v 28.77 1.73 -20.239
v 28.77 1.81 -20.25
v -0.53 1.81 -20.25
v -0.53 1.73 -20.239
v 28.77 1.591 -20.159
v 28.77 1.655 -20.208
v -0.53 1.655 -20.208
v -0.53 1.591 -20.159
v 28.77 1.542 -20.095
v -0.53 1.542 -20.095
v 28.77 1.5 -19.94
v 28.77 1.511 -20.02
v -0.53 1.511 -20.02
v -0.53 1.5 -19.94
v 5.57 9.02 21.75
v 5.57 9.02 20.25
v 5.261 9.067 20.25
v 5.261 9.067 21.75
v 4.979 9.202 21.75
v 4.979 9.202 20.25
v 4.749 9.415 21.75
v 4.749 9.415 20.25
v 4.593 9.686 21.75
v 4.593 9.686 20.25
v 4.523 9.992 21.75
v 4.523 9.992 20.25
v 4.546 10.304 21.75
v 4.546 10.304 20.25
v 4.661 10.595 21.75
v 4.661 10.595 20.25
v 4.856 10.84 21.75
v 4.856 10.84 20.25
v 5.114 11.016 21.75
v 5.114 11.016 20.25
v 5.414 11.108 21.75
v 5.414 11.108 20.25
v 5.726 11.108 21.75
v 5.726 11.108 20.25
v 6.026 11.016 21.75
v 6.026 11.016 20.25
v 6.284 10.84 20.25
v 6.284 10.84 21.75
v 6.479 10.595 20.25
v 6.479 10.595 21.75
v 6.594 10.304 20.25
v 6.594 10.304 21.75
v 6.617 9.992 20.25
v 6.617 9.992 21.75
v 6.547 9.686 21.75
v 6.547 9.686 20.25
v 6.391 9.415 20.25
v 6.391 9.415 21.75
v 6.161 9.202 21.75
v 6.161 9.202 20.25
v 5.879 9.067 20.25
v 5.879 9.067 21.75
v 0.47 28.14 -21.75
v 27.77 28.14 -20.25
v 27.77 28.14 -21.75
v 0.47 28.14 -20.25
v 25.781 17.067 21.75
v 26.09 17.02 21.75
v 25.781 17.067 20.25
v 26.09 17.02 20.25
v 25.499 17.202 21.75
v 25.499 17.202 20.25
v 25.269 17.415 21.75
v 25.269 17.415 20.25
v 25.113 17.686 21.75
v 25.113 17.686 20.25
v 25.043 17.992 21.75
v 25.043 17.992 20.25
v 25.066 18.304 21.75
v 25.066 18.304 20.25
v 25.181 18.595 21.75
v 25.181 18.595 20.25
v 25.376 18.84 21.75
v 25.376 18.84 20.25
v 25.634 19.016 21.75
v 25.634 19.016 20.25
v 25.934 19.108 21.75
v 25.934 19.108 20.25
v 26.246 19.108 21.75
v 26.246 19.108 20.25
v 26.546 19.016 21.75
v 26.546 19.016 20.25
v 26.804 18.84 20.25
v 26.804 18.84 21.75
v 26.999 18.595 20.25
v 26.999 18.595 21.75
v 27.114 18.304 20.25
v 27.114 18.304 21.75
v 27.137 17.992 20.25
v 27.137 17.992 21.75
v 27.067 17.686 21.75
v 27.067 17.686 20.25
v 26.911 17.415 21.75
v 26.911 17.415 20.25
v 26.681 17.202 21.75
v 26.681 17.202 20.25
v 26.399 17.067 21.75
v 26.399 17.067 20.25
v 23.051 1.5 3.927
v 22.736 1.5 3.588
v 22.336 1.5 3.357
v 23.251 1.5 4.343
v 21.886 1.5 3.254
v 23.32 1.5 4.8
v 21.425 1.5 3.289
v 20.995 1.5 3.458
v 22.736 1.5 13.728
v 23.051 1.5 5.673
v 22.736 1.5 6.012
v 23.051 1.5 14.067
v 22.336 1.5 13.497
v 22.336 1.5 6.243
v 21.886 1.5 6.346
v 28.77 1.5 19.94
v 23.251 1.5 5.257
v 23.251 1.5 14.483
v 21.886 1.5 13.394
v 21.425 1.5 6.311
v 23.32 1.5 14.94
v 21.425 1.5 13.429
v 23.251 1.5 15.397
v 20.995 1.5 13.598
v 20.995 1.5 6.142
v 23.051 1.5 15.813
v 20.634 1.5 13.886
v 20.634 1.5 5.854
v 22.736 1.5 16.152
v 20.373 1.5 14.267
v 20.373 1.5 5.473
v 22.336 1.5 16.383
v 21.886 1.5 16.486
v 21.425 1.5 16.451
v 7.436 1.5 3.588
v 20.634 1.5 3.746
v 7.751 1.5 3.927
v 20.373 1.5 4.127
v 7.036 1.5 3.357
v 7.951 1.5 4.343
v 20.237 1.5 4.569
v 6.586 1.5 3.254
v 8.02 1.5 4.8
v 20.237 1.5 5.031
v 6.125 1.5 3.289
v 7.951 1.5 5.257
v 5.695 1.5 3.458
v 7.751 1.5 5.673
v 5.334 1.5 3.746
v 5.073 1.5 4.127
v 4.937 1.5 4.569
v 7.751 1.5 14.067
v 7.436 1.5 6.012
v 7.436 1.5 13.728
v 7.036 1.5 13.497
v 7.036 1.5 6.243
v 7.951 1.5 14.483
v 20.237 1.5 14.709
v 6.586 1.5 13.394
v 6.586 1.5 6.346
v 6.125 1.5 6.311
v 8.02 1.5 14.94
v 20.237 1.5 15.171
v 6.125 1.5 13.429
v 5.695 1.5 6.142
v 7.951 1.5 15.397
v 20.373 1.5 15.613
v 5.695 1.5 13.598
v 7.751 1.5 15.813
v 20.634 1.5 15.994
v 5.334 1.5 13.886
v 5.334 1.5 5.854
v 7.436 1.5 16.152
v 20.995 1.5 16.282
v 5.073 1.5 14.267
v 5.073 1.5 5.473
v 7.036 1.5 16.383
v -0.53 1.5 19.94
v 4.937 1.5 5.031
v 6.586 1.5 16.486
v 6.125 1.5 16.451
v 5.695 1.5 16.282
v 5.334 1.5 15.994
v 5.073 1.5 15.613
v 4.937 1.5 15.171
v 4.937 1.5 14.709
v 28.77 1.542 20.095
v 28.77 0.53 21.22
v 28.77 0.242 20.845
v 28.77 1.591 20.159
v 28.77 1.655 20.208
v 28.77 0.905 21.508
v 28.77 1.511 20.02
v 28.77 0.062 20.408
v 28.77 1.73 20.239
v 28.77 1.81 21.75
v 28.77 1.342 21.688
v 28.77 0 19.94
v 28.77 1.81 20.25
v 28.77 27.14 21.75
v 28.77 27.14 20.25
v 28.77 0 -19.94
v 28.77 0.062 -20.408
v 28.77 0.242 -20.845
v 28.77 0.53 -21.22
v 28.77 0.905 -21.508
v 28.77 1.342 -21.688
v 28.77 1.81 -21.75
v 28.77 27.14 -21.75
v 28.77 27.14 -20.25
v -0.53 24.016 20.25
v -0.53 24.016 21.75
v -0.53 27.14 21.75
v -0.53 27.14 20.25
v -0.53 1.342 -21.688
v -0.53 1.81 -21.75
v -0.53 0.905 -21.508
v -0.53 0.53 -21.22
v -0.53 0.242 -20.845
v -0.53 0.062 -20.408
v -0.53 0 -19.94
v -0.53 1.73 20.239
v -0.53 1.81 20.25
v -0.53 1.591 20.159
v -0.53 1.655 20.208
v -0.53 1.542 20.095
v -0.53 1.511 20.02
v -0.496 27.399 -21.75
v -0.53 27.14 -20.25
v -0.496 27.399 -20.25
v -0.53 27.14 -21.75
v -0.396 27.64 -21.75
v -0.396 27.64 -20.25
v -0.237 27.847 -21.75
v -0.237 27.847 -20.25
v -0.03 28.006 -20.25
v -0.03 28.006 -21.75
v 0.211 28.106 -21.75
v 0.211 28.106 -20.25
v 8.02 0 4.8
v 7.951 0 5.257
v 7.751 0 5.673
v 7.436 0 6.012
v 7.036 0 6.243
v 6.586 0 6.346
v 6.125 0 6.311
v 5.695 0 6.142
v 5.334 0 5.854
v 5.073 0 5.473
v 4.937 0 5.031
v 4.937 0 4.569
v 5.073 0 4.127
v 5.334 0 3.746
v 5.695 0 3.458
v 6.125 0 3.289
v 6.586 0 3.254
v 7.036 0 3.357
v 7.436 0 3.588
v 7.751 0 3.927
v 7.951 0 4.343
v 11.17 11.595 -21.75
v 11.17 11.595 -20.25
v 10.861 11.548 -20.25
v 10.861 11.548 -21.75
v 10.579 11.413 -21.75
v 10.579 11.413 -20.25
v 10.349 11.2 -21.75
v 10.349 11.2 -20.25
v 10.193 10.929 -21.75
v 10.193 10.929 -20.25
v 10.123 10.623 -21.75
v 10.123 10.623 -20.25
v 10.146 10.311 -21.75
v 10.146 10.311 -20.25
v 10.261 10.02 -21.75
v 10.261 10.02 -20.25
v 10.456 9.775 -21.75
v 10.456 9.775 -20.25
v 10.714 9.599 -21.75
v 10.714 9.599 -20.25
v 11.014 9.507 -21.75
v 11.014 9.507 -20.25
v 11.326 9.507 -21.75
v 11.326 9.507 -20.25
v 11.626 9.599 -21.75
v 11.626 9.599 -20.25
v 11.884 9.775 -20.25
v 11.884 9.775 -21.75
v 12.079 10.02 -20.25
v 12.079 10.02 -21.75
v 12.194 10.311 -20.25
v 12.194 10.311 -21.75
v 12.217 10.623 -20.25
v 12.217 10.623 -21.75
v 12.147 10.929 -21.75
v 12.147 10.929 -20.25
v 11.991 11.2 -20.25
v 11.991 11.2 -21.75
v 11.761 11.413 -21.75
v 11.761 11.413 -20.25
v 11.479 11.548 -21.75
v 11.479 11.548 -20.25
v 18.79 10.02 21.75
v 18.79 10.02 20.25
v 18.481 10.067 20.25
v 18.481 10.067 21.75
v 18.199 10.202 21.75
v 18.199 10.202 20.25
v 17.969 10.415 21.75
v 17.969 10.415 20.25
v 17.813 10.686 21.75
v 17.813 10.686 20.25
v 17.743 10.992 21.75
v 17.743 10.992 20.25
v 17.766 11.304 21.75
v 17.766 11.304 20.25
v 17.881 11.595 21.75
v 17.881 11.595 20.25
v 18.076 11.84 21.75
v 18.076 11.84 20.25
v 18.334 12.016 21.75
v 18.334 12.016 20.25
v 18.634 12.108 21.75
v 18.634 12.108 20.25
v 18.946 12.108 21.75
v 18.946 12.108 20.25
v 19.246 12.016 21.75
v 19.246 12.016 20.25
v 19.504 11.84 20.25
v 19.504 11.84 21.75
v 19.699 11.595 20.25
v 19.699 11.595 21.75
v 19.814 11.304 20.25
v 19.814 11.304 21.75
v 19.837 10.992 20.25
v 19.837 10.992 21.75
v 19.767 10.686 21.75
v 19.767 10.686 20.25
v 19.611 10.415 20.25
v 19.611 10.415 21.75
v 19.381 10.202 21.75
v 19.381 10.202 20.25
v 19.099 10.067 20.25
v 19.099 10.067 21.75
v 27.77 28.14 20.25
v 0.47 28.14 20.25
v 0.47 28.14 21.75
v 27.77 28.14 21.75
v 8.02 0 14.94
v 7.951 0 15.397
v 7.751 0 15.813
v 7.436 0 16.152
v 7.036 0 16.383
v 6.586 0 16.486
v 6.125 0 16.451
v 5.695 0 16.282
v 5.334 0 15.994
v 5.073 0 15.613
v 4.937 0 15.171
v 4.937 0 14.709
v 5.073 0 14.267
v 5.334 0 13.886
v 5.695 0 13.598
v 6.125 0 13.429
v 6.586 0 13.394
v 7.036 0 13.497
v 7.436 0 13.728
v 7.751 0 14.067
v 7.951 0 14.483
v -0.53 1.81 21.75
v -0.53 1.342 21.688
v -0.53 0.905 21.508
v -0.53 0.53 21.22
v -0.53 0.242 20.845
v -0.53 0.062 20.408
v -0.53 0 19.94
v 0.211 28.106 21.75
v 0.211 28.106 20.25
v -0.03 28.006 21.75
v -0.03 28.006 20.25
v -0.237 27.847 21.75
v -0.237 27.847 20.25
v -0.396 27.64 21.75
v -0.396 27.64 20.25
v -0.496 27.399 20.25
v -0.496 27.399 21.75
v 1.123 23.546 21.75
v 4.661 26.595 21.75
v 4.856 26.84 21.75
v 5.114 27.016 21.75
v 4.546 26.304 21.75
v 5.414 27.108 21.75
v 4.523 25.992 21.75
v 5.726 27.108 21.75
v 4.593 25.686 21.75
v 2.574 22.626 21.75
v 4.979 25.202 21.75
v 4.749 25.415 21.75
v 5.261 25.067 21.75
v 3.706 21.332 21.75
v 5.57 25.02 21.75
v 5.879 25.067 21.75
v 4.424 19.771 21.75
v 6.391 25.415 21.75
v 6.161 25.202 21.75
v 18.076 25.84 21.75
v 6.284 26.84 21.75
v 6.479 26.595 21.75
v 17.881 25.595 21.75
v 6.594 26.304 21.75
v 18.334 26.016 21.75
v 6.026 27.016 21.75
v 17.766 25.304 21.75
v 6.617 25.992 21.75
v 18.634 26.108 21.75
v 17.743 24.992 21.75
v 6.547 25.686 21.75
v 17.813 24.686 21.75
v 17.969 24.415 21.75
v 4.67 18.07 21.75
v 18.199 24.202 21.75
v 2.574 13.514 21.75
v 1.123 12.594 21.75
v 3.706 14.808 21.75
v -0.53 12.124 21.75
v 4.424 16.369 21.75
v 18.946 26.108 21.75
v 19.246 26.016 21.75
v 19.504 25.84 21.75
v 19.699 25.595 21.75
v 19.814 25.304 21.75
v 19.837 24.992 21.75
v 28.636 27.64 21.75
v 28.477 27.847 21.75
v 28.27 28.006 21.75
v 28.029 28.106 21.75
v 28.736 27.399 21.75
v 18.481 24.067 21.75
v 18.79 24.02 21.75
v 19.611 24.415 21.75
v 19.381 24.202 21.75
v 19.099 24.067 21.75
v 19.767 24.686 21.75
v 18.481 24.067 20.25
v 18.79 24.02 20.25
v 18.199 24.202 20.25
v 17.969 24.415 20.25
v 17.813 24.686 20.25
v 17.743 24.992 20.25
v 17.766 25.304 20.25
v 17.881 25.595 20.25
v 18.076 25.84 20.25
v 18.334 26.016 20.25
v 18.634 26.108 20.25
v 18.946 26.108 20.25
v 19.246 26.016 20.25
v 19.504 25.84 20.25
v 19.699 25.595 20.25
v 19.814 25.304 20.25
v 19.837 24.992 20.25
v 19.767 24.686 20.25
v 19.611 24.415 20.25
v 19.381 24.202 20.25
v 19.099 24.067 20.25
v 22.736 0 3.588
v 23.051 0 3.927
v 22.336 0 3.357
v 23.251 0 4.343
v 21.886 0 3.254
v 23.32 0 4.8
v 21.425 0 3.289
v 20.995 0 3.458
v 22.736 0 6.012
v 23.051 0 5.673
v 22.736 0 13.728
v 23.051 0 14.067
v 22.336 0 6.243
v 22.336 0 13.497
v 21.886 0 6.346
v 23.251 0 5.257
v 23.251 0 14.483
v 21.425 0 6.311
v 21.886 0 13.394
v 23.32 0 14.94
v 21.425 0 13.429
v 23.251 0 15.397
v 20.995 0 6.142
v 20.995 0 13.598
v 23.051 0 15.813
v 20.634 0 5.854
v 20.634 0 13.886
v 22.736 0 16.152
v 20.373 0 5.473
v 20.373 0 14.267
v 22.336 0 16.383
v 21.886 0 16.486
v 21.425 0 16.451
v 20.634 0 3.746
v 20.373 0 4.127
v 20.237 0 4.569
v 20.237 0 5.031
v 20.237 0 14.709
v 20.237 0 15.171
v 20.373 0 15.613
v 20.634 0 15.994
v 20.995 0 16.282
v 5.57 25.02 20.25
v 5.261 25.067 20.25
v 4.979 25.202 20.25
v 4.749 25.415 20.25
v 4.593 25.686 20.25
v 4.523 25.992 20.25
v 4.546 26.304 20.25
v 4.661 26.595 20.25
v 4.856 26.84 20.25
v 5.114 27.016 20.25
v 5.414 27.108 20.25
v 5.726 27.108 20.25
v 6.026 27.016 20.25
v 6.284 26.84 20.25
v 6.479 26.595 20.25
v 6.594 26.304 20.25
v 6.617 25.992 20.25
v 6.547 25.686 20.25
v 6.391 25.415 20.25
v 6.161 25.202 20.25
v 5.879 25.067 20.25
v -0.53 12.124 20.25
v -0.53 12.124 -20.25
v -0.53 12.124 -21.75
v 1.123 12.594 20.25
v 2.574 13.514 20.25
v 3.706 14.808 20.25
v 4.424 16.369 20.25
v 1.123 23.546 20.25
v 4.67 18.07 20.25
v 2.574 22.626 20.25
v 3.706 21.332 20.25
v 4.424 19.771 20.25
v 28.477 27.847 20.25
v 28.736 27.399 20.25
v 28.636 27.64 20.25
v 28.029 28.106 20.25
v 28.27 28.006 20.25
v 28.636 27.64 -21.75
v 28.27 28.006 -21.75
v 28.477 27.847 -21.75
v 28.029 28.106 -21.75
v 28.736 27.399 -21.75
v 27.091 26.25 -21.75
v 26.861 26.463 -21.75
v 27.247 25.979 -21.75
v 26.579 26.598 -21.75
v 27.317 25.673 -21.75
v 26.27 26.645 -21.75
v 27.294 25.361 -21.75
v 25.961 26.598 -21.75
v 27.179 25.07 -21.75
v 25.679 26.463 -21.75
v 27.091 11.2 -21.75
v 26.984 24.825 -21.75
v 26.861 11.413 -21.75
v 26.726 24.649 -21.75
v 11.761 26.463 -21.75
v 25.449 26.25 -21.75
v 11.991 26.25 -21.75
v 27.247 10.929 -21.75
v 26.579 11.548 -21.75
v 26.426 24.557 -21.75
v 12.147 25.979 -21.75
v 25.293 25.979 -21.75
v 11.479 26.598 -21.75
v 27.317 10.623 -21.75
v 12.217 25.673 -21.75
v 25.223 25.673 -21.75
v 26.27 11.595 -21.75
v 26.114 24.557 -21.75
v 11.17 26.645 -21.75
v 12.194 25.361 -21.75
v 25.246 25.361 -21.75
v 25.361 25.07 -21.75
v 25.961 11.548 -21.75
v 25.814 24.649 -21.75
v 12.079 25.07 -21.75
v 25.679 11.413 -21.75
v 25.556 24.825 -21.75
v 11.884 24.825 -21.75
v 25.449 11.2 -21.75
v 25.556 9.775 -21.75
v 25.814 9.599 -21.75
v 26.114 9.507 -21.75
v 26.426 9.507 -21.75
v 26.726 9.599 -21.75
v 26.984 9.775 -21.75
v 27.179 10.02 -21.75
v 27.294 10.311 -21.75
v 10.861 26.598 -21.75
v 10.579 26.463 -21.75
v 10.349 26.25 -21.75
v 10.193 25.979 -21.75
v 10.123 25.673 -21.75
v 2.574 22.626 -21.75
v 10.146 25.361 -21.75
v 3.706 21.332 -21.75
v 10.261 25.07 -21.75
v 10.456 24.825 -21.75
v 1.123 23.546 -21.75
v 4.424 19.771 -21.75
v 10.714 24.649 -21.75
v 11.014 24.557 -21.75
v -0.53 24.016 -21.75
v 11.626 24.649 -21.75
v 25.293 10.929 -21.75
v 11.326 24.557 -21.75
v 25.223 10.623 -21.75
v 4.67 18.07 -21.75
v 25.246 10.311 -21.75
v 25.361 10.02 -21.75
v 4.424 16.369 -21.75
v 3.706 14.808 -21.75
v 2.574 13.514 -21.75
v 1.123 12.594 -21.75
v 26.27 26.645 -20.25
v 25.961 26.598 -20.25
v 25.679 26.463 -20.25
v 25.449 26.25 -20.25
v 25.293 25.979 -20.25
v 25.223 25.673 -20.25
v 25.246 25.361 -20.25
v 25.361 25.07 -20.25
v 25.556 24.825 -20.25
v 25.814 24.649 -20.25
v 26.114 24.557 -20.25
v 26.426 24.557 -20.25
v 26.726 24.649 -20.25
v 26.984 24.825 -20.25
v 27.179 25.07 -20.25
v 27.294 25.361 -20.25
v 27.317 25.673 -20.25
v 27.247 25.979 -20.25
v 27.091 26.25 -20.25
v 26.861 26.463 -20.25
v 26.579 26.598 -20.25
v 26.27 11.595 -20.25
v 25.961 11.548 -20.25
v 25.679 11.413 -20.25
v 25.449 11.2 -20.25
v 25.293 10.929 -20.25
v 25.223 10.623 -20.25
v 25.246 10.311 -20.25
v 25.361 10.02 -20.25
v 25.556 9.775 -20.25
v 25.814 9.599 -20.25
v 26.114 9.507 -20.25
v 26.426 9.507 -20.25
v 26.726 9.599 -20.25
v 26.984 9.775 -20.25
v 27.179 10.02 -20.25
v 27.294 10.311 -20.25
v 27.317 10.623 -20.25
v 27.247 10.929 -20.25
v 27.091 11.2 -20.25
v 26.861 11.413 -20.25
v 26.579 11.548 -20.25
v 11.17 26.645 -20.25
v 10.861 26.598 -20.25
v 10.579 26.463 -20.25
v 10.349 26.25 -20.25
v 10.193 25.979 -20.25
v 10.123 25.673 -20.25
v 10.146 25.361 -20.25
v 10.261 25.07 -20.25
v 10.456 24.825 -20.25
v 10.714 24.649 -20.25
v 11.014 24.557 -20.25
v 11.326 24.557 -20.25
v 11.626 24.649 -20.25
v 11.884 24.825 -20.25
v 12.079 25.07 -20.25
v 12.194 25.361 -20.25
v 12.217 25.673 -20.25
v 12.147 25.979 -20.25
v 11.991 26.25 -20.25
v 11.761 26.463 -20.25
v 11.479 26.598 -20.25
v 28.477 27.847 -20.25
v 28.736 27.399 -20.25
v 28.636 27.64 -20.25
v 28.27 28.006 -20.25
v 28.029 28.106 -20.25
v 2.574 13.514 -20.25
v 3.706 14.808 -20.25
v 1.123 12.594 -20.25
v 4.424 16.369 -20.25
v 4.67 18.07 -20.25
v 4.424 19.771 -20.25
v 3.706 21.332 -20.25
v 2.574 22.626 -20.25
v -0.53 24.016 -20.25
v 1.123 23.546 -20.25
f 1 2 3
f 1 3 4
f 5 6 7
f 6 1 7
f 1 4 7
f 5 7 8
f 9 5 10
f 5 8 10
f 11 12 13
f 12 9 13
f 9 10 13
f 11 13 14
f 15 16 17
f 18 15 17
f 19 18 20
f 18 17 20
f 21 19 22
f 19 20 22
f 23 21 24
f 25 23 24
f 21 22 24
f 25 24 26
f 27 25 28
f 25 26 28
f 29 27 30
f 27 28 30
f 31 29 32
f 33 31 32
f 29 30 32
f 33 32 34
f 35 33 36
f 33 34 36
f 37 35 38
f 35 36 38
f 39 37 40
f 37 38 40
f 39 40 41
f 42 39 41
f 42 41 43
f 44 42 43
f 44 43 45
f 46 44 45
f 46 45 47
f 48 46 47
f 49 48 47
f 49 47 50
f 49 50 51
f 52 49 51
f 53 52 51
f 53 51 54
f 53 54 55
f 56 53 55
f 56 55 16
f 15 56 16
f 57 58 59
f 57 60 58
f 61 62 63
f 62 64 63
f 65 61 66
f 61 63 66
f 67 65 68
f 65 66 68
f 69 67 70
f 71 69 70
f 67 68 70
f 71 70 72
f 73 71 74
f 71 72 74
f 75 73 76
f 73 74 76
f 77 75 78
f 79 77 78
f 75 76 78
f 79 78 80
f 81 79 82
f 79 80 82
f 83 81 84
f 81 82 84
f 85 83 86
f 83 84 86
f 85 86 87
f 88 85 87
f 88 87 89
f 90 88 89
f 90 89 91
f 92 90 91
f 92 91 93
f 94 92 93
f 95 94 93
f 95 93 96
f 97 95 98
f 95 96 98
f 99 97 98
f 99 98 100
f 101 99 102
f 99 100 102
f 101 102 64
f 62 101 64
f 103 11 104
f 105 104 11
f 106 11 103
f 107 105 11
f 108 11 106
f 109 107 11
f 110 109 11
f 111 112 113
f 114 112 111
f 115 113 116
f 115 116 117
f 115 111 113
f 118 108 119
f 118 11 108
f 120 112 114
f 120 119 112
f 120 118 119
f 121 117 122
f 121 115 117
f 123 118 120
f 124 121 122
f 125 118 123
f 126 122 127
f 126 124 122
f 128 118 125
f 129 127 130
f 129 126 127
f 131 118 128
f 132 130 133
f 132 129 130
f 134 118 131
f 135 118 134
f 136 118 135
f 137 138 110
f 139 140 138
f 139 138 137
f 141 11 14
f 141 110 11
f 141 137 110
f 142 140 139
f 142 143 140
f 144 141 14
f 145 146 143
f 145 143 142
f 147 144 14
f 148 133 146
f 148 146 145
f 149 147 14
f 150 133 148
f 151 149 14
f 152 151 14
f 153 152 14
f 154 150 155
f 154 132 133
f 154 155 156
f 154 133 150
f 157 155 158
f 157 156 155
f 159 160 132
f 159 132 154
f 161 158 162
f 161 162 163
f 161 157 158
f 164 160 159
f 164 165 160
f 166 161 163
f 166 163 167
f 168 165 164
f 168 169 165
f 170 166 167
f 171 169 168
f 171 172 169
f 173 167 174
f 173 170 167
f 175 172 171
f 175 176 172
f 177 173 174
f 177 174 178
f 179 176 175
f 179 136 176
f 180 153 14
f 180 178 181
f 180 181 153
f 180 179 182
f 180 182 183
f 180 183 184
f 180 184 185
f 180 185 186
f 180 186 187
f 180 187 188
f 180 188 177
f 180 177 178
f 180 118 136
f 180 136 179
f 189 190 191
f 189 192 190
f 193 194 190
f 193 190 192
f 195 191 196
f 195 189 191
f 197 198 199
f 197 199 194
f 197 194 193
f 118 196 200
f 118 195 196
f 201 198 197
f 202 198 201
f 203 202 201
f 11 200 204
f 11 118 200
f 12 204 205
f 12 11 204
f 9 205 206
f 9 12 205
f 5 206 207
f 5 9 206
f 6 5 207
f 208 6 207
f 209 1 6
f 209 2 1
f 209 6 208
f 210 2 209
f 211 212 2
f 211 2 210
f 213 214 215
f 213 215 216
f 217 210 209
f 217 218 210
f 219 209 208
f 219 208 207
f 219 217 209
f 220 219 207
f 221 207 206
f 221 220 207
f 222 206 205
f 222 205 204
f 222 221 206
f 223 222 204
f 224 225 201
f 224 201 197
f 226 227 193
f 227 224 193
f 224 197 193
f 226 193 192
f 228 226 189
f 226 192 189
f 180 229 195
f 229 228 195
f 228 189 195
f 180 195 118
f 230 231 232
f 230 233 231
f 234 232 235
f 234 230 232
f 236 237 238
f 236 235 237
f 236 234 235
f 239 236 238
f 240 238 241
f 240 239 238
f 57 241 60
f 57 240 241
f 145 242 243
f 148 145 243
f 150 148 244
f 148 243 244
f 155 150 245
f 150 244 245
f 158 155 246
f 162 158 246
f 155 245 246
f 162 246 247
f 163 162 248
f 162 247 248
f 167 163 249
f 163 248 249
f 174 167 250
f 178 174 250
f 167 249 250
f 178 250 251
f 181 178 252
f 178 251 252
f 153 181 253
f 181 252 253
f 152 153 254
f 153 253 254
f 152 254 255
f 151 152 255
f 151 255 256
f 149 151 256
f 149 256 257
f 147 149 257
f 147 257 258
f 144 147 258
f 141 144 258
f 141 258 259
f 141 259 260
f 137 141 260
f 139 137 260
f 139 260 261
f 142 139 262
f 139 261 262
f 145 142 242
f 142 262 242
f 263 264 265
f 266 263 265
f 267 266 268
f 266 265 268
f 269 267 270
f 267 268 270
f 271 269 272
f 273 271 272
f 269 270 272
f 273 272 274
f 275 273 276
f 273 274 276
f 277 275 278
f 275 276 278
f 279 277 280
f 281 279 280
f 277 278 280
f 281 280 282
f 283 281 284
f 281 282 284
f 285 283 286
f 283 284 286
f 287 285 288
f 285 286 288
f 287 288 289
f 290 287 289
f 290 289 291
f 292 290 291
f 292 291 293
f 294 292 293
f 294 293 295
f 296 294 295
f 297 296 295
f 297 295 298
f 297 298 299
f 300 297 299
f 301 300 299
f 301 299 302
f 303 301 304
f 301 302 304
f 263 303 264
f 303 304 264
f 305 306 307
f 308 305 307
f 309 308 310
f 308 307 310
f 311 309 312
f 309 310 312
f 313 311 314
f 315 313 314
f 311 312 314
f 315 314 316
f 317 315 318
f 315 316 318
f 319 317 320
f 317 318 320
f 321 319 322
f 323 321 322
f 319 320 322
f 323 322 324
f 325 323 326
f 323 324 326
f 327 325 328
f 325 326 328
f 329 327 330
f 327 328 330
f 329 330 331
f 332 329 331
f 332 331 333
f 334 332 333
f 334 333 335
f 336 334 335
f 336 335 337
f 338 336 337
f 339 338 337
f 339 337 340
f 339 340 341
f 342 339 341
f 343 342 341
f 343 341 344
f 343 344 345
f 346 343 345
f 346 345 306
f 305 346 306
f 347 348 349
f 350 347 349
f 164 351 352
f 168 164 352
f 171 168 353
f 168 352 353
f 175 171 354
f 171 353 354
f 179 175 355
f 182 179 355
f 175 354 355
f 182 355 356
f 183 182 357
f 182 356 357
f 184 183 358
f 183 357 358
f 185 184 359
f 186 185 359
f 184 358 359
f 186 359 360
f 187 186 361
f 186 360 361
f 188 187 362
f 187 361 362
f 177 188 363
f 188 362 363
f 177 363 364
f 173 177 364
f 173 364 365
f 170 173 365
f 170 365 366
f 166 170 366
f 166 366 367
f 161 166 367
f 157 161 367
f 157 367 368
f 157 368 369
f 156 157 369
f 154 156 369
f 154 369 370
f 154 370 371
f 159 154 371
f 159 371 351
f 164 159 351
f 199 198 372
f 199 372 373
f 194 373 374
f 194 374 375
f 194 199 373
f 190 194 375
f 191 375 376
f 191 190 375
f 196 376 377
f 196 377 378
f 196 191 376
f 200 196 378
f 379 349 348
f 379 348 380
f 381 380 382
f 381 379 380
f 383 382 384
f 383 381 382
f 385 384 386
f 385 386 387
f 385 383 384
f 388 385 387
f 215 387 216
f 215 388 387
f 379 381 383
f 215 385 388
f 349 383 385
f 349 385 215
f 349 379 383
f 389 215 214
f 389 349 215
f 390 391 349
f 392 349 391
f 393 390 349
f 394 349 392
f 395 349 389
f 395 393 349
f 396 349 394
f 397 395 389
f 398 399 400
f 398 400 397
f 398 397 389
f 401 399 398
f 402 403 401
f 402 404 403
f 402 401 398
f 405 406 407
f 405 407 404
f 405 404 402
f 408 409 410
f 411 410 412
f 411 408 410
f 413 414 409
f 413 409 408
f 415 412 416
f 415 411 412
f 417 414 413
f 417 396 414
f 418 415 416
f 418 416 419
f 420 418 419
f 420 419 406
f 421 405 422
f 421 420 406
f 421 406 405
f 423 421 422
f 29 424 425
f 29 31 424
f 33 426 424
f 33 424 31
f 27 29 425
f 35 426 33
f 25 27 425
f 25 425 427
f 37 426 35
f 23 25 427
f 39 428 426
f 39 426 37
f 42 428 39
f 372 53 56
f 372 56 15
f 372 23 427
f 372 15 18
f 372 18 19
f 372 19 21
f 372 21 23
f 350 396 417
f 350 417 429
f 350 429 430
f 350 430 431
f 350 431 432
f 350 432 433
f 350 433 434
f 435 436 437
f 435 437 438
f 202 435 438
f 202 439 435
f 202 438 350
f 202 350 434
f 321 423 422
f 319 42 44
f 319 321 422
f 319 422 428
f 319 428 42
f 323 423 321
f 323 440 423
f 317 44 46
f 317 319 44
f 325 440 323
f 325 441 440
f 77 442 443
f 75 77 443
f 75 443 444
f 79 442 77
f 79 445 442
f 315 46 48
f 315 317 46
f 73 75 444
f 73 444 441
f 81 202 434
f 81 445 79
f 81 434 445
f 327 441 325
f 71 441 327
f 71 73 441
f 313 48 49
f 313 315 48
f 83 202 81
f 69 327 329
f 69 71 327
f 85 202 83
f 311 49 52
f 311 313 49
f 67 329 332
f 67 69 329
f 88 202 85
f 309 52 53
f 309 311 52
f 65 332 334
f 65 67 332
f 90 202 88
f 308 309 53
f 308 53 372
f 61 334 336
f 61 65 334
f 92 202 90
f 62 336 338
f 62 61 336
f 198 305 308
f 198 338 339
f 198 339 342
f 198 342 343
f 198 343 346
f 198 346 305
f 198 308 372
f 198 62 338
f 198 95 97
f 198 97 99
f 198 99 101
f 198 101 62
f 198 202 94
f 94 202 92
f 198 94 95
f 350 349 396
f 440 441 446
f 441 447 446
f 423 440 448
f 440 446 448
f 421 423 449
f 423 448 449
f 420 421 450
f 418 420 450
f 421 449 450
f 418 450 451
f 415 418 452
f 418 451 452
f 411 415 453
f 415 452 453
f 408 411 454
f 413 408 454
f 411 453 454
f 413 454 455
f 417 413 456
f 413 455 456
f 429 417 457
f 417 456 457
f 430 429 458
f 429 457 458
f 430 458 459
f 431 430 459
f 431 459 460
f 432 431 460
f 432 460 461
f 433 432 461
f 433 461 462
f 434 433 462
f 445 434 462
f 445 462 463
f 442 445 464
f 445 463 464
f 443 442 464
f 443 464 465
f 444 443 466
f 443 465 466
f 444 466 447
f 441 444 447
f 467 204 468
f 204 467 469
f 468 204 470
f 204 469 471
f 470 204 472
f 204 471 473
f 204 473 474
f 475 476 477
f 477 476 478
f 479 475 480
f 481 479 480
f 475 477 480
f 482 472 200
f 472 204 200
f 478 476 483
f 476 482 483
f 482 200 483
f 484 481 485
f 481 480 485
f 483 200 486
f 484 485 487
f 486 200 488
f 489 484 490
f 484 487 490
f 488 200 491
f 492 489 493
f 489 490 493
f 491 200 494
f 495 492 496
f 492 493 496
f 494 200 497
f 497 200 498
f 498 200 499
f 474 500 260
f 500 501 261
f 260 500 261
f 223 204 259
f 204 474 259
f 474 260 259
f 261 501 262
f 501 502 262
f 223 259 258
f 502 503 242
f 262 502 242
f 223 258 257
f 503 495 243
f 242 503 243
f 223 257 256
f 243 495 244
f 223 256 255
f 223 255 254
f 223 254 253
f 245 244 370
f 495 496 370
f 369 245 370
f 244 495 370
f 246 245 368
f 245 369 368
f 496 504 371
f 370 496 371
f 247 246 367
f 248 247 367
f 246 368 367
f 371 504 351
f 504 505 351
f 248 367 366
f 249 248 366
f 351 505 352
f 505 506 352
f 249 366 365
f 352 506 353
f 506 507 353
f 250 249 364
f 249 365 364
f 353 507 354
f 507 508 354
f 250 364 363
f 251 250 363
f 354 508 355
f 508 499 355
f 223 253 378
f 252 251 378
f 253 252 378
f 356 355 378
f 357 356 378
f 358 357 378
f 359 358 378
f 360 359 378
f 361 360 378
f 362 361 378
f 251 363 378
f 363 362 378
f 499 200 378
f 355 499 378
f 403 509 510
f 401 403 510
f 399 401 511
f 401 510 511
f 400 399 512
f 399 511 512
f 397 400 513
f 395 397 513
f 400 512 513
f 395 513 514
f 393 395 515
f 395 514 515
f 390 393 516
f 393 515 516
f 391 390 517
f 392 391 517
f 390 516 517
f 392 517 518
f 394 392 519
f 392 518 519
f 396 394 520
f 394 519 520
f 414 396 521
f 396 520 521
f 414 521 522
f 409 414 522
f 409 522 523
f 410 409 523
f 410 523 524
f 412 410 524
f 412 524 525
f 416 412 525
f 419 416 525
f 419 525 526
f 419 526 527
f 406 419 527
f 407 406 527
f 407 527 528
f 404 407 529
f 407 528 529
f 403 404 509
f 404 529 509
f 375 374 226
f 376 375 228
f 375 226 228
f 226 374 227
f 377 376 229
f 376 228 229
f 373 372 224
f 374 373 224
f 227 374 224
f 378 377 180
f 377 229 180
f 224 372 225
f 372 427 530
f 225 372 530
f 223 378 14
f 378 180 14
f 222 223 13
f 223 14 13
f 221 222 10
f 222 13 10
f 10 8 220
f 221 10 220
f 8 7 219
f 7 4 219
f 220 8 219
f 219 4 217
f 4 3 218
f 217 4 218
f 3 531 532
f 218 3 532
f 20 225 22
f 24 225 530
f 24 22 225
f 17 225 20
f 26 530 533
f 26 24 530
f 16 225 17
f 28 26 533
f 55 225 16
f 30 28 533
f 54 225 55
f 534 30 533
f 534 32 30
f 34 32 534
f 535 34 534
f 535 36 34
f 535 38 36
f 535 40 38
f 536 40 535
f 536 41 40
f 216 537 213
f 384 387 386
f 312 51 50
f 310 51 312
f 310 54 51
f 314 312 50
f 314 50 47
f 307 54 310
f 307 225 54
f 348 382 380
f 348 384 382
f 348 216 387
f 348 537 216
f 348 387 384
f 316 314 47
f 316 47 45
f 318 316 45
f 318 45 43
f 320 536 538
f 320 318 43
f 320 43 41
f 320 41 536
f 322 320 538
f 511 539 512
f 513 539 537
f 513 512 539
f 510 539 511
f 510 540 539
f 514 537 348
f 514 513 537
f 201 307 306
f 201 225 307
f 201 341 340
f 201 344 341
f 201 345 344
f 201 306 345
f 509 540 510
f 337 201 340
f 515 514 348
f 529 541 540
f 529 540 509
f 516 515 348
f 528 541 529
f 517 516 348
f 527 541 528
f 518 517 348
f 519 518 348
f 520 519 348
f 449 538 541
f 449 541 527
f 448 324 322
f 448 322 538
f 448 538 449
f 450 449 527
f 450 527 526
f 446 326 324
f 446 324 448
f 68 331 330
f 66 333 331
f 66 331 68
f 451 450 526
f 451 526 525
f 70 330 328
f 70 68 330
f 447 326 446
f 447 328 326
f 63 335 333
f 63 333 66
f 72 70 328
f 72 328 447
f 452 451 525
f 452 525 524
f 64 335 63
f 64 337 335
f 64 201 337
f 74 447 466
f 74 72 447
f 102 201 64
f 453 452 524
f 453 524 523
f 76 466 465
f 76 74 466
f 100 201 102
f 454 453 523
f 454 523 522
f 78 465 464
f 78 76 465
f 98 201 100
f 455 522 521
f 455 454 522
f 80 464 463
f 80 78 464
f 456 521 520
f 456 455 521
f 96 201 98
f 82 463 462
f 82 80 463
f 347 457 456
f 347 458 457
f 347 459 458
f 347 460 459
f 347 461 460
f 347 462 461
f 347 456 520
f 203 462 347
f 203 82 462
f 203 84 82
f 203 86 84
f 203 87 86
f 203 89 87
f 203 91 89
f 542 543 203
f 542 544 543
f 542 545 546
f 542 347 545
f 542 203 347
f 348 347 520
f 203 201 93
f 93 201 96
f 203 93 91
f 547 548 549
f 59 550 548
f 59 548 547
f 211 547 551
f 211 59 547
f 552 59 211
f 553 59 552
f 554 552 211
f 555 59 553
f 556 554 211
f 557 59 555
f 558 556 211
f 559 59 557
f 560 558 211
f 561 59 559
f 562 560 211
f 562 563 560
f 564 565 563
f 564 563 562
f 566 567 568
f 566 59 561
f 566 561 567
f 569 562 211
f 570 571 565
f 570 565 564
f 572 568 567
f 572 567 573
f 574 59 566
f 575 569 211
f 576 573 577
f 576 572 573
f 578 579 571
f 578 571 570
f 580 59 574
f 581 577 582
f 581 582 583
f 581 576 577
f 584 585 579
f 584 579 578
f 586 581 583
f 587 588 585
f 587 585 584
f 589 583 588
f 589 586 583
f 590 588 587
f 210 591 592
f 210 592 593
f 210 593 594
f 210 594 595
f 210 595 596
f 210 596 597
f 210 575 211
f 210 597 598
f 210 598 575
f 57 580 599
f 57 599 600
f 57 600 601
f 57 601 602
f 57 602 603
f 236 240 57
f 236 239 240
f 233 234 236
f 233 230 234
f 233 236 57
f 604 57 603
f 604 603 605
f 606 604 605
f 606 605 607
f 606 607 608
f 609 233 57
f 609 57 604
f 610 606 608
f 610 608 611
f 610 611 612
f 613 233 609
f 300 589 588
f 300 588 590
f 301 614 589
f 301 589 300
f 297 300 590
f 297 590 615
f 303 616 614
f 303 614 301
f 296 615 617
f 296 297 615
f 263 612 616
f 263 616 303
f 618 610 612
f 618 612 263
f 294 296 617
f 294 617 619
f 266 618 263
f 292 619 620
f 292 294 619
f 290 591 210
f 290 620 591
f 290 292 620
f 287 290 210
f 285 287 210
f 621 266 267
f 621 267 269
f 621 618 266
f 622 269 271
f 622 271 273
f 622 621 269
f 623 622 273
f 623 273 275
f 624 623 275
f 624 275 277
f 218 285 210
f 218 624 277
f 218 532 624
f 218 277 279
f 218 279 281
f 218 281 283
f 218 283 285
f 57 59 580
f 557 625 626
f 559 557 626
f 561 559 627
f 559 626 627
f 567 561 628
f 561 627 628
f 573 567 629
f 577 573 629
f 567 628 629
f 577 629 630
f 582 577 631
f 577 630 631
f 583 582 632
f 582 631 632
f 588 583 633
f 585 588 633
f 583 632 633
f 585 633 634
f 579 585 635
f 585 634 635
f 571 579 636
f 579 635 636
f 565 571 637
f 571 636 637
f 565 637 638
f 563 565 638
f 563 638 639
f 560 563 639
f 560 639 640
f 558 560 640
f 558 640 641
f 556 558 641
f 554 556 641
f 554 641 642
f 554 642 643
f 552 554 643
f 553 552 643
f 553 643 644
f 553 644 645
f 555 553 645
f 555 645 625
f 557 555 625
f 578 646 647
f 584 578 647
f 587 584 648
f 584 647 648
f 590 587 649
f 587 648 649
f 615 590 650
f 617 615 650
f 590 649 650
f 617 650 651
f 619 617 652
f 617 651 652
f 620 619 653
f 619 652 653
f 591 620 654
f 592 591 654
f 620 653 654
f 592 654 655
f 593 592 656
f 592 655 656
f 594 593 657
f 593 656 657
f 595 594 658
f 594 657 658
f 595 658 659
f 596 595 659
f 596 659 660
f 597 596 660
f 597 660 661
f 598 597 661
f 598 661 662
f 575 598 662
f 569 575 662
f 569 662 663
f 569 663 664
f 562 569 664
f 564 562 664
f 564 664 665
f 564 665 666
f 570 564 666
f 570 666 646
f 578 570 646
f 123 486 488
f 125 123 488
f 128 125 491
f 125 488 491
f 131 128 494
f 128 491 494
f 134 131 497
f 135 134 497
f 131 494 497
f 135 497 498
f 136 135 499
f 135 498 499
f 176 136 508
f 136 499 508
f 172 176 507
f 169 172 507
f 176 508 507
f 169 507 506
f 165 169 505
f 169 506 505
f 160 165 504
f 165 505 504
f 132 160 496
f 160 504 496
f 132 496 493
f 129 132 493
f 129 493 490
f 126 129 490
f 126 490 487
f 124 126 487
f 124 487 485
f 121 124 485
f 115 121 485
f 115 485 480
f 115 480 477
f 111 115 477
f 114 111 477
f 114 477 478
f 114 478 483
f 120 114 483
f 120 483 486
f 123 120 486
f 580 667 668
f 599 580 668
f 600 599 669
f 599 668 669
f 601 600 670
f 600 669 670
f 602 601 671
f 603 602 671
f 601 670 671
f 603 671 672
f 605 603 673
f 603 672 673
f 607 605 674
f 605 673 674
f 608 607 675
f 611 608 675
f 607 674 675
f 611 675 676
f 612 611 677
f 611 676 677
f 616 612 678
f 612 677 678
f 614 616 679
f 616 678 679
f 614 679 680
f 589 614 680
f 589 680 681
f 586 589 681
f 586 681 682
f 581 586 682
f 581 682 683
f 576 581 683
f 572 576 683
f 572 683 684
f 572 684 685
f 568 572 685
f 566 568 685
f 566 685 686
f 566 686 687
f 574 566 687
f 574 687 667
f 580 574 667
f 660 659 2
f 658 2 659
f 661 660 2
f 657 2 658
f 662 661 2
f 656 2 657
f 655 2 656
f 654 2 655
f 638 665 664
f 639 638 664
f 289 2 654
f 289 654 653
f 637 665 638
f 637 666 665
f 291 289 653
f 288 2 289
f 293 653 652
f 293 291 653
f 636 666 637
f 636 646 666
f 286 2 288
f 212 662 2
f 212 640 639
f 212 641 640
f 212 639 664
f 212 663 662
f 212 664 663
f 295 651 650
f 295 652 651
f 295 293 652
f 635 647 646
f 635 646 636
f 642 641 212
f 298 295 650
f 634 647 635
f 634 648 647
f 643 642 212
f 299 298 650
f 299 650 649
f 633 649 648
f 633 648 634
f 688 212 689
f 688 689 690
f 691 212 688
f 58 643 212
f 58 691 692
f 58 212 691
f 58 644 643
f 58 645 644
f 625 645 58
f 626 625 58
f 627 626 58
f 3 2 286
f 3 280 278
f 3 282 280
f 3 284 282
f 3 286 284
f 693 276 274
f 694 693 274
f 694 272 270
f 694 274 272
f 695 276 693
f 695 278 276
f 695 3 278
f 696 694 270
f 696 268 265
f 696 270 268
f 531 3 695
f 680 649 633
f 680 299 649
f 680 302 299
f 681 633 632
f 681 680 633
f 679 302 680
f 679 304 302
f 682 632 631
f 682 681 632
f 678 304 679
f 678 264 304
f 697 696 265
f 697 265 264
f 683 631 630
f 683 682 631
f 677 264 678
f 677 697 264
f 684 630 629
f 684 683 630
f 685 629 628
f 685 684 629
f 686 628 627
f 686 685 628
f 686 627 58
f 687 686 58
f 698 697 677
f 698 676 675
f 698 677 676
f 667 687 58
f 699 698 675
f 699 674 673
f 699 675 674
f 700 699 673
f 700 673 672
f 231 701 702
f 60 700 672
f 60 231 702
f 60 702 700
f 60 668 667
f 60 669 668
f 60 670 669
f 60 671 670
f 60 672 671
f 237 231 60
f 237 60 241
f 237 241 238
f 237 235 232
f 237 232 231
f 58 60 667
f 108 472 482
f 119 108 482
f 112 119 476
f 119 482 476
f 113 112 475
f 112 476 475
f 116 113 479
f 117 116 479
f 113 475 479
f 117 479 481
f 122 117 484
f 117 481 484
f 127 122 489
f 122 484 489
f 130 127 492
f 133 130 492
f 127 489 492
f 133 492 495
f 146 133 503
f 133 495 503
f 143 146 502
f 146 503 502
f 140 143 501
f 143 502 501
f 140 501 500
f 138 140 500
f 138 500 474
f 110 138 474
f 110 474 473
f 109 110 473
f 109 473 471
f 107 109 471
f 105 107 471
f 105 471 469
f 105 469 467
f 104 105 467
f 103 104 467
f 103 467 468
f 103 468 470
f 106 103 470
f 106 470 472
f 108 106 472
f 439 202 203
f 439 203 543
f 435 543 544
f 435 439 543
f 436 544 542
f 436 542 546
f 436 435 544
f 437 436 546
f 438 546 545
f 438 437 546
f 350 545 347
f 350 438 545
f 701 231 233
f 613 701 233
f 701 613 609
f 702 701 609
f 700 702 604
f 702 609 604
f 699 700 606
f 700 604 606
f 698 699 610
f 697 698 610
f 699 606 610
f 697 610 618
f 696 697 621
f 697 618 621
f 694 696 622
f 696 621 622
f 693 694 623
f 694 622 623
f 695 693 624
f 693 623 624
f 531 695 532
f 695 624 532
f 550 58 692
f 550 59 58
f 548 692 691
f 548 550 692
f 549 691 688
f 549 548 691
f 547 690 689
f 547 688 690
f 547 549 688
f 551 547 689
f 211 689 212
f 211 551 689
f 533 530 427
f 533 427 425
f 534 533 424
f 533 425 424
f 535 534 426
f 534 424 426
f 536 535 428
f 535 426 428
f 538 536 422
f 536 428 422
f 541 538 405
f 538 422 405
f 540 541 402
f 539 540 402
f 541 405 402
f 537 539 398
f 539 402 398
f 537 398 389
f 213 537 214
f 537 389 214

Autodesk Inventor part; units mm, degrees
ref_plane "YZ Plane" through (0, 0, 0) normal (1, 0, 0) x (0, 1, 0)
ref_plane "XZ Plane" through (0, 0, 0) normal (0, 1, 0) x (-1, 0, 0)
ref_plane "XY Plane" through (0, 0, 0) normal (0, 0, 1) x (1, 0, 0)
sketch "Sketch1" plane through (0, 0, 0) normal (0, 1, 0) x (-1, 0, 0)
  line L0 (0.53, 20.25) -> (-28.77, 20.25)
  line L1 (-28.77, 20.25) -> (-28.77, -20.25)
  line L2 (-28.77, -20.25) -> (0.53, -20.25)
  line L3 (0.53, -20.25) -> (0.53, 20.25)
  point P0 (0, 0)
  dimension "d0" = 40.5
  dimension "d1" = 29.3
  dimension "d2" = -0.53
  dimension "d3" = 20.25
extrude "Plate1" add sketch "Sketch1" along normal blind 1.5
sketch "Sketch2" plane through (28.77, 0, 21.75) normal (0, 0, -1) x (-1, 0, 0)
  line L0 (29.3, 0) -> (0, 0)
  line L1 (0, 0) -> (0, 28.14)
  line L2 (0, 28.14) -> (29.3, 28.14)
  line L3 (29.3, 28.14) -> (29.3, 0)
edge flange "Flange1" height 28.14 angle 90 thickness 1.5 bend radius 0.31 thickness toward (0, 0, -1) relief tear relief width 1.5 relief depth 0.75 corner gap 0.31 corner form 0 edges at (14.12, 1.5, 20.25) (14.12, 1.5, -20.25) wall of the first edge with corners at (-0.53, 0, 21.75) (28.77, 0, 21.75) (28.77, 28.14, 21.75) (-0.53, 28.14, 21.75)
bend "Bend1"
corner "Corner1"
sketch "Sketch6" plane through (-0.53, 28.14, 21.75) normal (0, 0, 1) x (1, 0, 0)
  point P0 (0.53, -28.14)
sketch "Sketch8" plane through (28.77, 28.14, -21.75) normal (0, 0, -1) x (-1, 0, 0)
  circle A0 centre (2.5, -2.545) radius 0.7835
  circle A1 centre (2.5, -17.595) radius 0.7835
  circle A2 centre (17.6, -2.545) radius 0.7835
  circle A3 centre (17.6, -17.595) radius 0.7835
  circle A4 centre (37.6, -2.545) radius 0.7835
  circle A5 centre (37.6, -17.595) radius 0.7835
  point P0 (28.77, -28.14)
hole "Hole4" at (26.27, 25.595, -21.75) at (26.27, 10.545, -21.75) at (11.17, 25.595, -21.75) at (11.17, 10.545, -21.75) at (-8.83, 25.595, -21.75) at (-8.83, 10.545, -21.75) direction (0, 0, 1) diameter 2.1 depth 1.5
sketch "Sketch9" plane through (28.77, 28.14, -21.75) normal (0, 0, -1) x (-1, 0, 0)
  circle A0 centre (30.1, -10.07) radius 6
  point P0 (28.77, -28.14)
extrude "Cut2" cut sketch "Sketch9" against normal blind 1.5
sketch "Sketch10" plane through (-0.53, 28.14, 21.75) normal (0, 0, 1) x (1, 0, 0)
  point P0 (0.53, -28.14)
sketch "Sketch11" plane through (-0.53, 28.14, 21.75) normal (0, 0, 1) x (1, 0, 0)
  point P0 (0.53, -28.14)
sketch "Sketch15" plane through (0, 0, 0) normal (0, -1, 0) x (1, 0, 0)
  point P0 (0, 0)
sketch "Sketch16" plane through (0, 0, 0) normal (0, -1, 0) x (1, 0, 0)
  circle A0 centre (6.47, 14.94) radius 1.55
  line L0 (28.77, 19.94) -> (-0.53, 19.94) projected
  line L1 (-0.53, -19.94) -> (-0.53, 19.94) projected
  circle A1 centre (21.77, 14.94) radius 1.55
  line L2 (28.77, 19.94) -> (28.77, -19.94) projected
  circle A2 centre (6.47, 4.8) radius 1.55
  circle A3 centre (21.77, 4.8) radius 1.55
  point P0 (0, 0)
  dimension "d65" = 3.1
  dimension "d66" = 5
  dimension "d67" = 7
  dimension "d68" = 3.1
  dimension "d69" = 5
  dimension "d70" = 7
  dimension "d71" = 3.1
  dimension "d72" = 15.14
  dimension "d73" = 7
  dimension "d74" = 3.1
  dimension "d75" = 15.14
  dimension "d76" = 7
extrude "Cut6" cut sketch "Sketch16" against normal blind 1.5
sketch "Sketch18" plane through (-0.53, 28.14, 21.75) normal (0, 0, 1) x (1, 0, 0)
  circle A0 centre (-0.8, -10.07) radius 6
  point P0 (0.53, -28.14)
extrude "Cut7" cut sketch "Sketch18" against normal blind 1.5
fillet "Corner Round1" radius 1 4 edges at (-0.53, 28.14, -21) (28.77, 28.14, -21) (28.77, 28.14, 21) (-0.53, 28.14, 21)
sketch "Sketch19" plane through (-0.53, 1.81, 21.75) normal (0, 0, 1) x (1, 0, 0)
  circle A0 centre (6.1, 24.26) radius 0.7835
  circle A1 centre (19.32, 23.26) radius 0.7835
  circle A2 centre (26.62, 16.26) radius 0.7835
  circle A3 centre (19.32, 9.26) radius 0.7835
  circle A4 centre (6.1, 8.26) radius 0.7835
  point P0 (0.53, -1.81)
hole "Hole6" at (5.57, 26.07, 21.75) at (18.79, 25.07, 21.75) at (26.09, 18.07, 21.75) at (18.79, 11.07, 21.75) at (5.57, 10.07, 21.75) direction (0, 0, -1) diameter 2.1 depth 1.5
equation "\"d55\" = Thickness"
equation "\"d57\" = Thickness"
equation "\"d77\" = Thickness"
equation "\"d86\" = Thickness"
equation "\"d94\" = Thickness"
equation "\"d4\" = Thickness"
equation "\"d5\" = BendReliefWidth"
equation "\"d6\" = BendReliefDepth"
equation "\"d7\" = MinimumRemnant"
equation "\"d8\" = TransitionRadius"
equation "\"d11\" = BendRadius"
equation "\"d12\" = CornerReliefSize"
equation "\"d13\" = GapSize"
equation "\"d14\" = JacobiRadiusSize"
equation "\"BendReliefWidth\" = Thickness"
equation "\"BendReliefDepth\" = 0.5 * Thickness"
equation "\"CornerReliefSize\" = 4 * Thickness"
equation "\"MinimumRemnant\" = 2 * Thickness"
equation "\"TransitionRadius\" = BendRadius"
equation "\"JacobiRadiusSize\" = BendRadius"
equation "\"GapSize\" = Thickness"
equation "\"Thickness\" = 1.5"
equation "\"BendRadius\" = 0.31"
properties part number "axis_25_bottom_frame" material "Aluminum 6061-AHC"
